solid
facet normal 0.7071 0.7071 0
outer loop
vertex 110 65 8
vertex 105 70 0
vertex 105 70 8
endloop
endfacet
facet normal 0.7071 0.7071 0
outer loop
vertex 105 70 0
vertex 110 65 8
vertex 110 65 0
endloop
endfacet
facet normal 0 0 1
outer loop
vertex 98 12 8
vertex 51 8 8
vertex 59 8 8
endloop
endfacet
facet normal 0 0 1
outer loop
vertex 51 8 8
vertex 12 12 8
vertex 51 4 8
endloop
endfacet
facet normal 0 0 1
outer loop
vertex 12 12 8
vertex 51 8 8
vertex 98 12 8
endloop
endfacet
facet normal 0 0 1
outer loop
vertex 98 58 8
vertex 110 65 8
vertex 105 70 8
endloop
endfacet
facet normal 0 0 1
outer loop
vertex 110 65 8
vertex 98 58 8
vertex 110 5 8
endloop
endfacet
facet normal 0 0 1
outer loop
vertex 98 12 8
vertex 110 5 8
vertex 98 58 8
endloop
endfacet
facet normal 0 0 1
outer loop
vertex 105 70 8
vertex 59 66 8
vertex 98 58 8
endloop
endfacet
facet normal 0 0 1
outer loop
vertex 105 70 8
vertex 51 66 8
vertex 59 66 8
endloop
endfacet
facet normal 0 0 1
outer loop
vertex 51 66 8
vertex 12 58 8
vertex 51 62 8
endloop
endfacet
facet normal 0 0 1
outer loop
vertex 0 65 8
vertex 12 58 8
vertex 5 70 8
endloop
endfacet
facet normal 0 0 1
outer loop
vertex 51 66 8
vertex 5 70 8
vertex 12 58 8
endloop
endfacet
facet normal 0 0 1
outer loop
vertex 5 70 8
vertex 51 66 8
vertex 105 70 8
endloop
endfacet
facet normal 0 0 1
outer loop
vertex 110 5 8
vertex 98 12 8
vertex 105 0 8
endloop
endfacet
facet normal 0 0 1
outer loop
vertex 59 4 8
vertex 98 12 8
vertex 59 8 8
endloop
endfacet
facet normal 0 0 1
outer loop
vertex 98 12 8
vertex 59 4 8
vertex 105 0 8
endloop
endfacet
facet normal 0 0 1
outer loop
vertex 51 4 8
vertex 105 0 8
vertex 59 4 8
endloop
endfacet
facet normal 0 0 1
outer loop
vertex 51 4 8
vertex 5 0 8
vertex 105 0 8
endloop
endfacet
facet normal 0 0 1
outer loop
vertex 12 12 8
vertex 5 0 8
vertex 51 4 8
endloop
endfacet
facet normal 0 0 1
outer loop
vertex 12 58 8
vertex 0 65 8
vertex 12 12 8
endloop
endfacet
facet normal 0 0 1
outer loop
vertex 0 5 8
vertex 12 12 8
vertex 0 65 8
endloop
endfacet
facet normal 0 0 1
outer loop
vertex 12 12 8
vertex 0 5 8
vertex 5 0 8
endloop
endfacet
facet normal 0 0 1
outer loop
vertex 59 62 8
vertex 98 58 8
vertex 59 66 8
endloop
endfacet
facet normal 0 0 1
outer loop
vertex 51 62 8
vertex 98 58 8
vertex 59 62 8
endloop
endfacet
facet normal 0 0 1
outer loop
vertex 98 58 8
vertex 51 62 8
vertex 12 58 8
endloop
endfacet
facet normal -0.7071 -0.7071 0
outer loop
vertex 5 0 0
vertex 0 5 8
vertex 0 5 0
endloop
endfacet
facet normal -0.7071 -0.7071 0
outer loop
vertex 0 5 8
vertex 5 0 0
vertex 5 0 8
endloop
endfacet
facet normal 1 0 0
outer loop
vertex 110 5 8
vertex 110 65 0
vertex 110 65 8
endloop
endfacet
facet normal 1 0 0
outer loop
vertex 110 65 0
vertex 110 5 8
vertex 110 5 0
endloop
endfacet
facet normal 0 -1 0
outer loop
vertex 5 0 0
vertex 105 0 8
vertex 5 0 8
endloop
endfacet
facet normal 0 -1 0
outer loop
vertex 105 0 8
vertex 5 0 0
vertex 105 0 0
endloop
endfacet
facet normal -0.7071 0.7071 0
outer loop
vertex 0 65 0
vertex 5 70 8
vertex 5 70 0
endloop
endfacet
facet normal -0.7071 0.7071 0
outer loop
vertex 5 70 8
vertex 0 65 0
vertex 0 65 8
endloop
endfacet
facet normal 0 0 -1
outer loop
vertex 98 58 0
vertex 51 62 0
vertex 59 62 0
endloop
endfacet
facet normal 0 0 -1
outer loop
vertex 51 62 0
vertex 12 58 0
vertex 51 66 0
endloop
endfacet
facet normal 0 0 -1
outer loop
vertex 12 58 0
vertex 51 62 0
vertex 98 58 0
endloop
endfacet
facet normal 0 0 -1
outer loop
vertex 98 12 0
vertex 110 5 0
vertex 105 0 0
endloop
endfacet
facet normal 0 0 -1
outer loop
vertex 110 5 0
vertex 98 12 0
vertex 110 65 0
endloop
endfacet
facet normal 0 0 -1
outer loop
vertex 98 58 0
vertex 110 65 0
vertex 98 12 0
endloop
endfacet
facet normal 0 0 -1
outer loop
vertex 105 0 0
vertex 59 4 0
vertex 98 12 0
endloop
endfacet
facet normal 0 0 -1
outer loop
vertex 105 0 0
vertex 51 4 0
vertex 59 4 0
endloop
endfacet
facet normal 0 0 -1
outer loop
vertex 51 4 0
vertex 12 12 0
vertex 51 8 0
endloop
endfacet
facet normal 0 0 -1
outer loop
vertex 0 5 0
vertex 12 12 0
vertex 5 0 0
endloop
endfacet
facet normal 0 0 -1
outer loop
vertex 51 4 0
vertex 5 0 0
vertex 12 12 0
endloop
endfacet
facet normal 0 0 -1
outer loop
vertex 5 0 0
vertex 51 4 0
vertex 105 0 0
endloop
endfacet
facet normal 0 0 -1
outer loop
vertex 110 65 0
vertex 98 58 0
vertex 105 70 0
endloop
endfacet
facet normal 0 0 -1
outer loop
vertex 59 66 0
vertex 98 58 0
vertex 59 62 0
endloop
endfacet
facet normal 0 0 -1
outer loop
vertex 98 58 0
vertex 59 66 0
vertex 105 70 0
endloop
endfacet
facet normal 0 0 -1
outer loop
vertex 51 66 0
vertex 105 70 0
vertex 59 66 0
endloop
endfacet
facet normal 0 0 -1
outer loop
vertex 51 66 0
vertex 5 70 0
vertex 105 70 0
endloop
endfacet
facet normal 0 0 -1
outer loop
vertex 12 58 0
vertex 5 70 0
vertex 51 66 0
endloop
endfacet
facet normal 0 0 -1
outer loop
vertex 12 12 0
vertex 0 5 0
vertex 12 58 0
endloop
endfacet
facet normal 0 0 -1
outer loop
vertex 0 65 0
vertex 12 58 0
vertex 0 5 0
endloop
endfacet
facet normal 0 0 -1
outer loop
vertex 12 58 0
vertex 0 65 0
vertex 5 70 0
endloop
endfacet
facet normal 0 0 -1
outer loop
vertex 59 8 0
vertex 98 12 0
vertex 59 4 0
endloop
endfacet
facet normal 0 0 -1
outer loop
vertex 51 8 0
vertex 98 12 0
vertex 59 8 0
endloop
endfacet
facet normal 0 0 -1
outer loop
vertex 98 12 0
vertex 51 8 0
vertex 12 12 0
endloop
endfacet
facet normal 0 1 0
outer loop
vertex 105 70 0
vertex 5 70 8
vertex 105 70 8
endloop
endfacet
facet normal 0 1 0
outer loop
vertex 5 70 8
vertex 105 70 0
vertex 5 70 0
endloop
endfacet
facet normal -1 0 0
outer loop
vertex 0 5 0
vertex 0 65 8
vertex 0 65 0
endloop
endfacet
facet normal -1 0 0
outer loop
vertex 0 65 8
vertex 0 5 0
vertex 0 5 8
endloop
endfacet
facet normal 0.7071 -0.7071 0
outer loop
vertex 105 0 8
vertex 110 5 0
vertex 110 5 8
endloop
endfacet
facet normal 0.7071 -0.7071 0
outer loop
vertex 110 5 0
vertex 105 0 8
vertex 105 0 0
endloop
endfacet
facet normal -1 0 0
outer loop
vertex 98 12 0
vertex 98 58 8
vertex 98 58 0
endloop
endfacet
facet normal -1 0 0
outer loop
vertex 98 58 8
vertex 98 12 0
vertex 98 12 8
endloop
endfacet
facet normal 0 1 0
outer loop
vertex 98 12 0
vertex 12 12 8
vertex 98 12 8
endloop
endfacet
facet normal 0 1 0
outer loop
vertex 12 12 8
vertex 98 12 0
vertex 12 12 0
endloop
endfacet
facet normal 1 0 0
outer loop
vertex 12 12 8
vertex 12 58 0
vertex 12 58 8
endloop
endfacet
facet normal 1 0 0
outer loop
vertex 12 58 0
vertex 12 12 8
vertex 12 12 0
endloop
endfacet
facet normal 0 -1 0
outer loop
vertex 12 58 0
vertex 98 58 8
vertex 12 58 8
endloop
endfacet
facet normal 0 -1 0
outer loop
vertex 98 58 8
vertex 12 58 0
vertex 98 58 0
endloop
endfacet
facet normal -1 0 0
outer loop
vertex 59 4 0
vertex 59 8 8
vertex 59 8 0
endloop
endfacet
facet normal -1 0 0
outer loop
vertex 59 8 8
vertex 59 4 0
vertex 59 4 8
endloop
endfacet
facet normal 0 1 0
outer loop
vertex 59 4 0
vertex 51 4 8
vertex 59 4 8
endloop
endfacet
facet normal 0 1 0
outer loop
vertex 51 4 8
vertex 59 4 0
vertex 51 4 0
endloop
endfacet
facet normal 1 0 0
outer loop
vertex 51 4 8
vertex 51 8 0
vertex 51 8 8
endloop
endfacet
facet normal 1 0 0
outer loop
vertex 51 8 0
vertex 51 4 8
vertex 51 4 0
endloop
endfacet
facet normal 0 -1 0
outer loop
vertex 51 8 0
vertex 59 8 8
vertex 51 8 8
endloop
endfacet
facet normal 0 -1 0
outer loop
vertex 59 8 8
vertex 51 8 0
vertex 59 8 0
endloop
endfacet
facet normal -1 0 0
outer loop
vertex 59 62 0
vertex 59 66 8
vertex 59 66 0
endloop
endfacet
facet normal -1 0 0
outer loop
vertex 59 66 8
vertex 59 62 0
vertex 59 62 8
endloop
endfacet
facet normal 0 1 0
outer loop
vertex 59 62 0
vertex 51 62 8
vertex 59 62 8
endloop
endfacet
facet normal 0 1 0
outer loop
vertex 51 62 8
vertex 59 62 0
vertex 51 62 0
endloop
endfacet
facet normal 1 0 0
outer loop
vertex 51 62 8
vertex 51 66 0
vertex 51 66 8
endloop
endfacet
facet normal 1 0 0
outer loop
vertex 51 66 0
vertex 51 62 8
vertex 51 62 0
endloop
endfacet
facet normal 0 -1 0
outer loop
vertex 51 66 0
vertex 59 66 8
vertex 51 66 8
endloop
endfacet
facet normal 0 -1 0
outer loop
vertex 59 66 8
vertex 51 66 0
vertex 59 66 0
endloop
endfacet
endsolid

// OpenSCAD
$fn = 32;

// ----------------------------------------------------------------------
// Frame plate: 110 x 70 frame, 12 mm rails
// ----------------------------------------------------------------------

// --- parameters (mm) ---
plate_l = 110;            // plate length, X
plate_w = 70;             // plate width, Y
plate_t = 8;              // plate thickness, Z (extrusion height)
corner_c = 5;             // corner chamfer
frame_bar = 12;           // frame rail width
slot_l = 8;               // adjustment slot length
slot_w = 4;               // adjustment slot width

win_l = plate_l - 2 * frame_bar;  // window length
win_w = plate_w - 2 * frame_bar;  // window width

profile = [[5, 0], [105, 0], [110, 5], [110, 65], [105, 70], [5, 70], [0, 65], [0, 5]];  // primary outline, 8 points, counter clockwise
void_1 = [[12, 12], [98, 12], [98, 58], [12, 58]];  // the window, 4 points
void_2 = [[51, 4], [59, 4], [59, 8], [51, 8]];  // adjustment slot, 4 points
void_3 = [[51, 62], [59, 62], [59, 66], [51, 66]];  // adjustment slot, 4 points

// --- the one profile operation ---
difference() {
  linear_extrude(height = plate_t) polygon(points = profile);
  translate([0, 0, -1])
    linear_extrude(height = plate_t + 2) polygon(points = void_1);
  translate([0, 0, -1])
    linear_extrude(height = plate_t + 2) polygon(points = void_2);
  translate([0, 0, -1])
    linear_extrude(height = plate_t + 2) polygon(points = void_3);
}
